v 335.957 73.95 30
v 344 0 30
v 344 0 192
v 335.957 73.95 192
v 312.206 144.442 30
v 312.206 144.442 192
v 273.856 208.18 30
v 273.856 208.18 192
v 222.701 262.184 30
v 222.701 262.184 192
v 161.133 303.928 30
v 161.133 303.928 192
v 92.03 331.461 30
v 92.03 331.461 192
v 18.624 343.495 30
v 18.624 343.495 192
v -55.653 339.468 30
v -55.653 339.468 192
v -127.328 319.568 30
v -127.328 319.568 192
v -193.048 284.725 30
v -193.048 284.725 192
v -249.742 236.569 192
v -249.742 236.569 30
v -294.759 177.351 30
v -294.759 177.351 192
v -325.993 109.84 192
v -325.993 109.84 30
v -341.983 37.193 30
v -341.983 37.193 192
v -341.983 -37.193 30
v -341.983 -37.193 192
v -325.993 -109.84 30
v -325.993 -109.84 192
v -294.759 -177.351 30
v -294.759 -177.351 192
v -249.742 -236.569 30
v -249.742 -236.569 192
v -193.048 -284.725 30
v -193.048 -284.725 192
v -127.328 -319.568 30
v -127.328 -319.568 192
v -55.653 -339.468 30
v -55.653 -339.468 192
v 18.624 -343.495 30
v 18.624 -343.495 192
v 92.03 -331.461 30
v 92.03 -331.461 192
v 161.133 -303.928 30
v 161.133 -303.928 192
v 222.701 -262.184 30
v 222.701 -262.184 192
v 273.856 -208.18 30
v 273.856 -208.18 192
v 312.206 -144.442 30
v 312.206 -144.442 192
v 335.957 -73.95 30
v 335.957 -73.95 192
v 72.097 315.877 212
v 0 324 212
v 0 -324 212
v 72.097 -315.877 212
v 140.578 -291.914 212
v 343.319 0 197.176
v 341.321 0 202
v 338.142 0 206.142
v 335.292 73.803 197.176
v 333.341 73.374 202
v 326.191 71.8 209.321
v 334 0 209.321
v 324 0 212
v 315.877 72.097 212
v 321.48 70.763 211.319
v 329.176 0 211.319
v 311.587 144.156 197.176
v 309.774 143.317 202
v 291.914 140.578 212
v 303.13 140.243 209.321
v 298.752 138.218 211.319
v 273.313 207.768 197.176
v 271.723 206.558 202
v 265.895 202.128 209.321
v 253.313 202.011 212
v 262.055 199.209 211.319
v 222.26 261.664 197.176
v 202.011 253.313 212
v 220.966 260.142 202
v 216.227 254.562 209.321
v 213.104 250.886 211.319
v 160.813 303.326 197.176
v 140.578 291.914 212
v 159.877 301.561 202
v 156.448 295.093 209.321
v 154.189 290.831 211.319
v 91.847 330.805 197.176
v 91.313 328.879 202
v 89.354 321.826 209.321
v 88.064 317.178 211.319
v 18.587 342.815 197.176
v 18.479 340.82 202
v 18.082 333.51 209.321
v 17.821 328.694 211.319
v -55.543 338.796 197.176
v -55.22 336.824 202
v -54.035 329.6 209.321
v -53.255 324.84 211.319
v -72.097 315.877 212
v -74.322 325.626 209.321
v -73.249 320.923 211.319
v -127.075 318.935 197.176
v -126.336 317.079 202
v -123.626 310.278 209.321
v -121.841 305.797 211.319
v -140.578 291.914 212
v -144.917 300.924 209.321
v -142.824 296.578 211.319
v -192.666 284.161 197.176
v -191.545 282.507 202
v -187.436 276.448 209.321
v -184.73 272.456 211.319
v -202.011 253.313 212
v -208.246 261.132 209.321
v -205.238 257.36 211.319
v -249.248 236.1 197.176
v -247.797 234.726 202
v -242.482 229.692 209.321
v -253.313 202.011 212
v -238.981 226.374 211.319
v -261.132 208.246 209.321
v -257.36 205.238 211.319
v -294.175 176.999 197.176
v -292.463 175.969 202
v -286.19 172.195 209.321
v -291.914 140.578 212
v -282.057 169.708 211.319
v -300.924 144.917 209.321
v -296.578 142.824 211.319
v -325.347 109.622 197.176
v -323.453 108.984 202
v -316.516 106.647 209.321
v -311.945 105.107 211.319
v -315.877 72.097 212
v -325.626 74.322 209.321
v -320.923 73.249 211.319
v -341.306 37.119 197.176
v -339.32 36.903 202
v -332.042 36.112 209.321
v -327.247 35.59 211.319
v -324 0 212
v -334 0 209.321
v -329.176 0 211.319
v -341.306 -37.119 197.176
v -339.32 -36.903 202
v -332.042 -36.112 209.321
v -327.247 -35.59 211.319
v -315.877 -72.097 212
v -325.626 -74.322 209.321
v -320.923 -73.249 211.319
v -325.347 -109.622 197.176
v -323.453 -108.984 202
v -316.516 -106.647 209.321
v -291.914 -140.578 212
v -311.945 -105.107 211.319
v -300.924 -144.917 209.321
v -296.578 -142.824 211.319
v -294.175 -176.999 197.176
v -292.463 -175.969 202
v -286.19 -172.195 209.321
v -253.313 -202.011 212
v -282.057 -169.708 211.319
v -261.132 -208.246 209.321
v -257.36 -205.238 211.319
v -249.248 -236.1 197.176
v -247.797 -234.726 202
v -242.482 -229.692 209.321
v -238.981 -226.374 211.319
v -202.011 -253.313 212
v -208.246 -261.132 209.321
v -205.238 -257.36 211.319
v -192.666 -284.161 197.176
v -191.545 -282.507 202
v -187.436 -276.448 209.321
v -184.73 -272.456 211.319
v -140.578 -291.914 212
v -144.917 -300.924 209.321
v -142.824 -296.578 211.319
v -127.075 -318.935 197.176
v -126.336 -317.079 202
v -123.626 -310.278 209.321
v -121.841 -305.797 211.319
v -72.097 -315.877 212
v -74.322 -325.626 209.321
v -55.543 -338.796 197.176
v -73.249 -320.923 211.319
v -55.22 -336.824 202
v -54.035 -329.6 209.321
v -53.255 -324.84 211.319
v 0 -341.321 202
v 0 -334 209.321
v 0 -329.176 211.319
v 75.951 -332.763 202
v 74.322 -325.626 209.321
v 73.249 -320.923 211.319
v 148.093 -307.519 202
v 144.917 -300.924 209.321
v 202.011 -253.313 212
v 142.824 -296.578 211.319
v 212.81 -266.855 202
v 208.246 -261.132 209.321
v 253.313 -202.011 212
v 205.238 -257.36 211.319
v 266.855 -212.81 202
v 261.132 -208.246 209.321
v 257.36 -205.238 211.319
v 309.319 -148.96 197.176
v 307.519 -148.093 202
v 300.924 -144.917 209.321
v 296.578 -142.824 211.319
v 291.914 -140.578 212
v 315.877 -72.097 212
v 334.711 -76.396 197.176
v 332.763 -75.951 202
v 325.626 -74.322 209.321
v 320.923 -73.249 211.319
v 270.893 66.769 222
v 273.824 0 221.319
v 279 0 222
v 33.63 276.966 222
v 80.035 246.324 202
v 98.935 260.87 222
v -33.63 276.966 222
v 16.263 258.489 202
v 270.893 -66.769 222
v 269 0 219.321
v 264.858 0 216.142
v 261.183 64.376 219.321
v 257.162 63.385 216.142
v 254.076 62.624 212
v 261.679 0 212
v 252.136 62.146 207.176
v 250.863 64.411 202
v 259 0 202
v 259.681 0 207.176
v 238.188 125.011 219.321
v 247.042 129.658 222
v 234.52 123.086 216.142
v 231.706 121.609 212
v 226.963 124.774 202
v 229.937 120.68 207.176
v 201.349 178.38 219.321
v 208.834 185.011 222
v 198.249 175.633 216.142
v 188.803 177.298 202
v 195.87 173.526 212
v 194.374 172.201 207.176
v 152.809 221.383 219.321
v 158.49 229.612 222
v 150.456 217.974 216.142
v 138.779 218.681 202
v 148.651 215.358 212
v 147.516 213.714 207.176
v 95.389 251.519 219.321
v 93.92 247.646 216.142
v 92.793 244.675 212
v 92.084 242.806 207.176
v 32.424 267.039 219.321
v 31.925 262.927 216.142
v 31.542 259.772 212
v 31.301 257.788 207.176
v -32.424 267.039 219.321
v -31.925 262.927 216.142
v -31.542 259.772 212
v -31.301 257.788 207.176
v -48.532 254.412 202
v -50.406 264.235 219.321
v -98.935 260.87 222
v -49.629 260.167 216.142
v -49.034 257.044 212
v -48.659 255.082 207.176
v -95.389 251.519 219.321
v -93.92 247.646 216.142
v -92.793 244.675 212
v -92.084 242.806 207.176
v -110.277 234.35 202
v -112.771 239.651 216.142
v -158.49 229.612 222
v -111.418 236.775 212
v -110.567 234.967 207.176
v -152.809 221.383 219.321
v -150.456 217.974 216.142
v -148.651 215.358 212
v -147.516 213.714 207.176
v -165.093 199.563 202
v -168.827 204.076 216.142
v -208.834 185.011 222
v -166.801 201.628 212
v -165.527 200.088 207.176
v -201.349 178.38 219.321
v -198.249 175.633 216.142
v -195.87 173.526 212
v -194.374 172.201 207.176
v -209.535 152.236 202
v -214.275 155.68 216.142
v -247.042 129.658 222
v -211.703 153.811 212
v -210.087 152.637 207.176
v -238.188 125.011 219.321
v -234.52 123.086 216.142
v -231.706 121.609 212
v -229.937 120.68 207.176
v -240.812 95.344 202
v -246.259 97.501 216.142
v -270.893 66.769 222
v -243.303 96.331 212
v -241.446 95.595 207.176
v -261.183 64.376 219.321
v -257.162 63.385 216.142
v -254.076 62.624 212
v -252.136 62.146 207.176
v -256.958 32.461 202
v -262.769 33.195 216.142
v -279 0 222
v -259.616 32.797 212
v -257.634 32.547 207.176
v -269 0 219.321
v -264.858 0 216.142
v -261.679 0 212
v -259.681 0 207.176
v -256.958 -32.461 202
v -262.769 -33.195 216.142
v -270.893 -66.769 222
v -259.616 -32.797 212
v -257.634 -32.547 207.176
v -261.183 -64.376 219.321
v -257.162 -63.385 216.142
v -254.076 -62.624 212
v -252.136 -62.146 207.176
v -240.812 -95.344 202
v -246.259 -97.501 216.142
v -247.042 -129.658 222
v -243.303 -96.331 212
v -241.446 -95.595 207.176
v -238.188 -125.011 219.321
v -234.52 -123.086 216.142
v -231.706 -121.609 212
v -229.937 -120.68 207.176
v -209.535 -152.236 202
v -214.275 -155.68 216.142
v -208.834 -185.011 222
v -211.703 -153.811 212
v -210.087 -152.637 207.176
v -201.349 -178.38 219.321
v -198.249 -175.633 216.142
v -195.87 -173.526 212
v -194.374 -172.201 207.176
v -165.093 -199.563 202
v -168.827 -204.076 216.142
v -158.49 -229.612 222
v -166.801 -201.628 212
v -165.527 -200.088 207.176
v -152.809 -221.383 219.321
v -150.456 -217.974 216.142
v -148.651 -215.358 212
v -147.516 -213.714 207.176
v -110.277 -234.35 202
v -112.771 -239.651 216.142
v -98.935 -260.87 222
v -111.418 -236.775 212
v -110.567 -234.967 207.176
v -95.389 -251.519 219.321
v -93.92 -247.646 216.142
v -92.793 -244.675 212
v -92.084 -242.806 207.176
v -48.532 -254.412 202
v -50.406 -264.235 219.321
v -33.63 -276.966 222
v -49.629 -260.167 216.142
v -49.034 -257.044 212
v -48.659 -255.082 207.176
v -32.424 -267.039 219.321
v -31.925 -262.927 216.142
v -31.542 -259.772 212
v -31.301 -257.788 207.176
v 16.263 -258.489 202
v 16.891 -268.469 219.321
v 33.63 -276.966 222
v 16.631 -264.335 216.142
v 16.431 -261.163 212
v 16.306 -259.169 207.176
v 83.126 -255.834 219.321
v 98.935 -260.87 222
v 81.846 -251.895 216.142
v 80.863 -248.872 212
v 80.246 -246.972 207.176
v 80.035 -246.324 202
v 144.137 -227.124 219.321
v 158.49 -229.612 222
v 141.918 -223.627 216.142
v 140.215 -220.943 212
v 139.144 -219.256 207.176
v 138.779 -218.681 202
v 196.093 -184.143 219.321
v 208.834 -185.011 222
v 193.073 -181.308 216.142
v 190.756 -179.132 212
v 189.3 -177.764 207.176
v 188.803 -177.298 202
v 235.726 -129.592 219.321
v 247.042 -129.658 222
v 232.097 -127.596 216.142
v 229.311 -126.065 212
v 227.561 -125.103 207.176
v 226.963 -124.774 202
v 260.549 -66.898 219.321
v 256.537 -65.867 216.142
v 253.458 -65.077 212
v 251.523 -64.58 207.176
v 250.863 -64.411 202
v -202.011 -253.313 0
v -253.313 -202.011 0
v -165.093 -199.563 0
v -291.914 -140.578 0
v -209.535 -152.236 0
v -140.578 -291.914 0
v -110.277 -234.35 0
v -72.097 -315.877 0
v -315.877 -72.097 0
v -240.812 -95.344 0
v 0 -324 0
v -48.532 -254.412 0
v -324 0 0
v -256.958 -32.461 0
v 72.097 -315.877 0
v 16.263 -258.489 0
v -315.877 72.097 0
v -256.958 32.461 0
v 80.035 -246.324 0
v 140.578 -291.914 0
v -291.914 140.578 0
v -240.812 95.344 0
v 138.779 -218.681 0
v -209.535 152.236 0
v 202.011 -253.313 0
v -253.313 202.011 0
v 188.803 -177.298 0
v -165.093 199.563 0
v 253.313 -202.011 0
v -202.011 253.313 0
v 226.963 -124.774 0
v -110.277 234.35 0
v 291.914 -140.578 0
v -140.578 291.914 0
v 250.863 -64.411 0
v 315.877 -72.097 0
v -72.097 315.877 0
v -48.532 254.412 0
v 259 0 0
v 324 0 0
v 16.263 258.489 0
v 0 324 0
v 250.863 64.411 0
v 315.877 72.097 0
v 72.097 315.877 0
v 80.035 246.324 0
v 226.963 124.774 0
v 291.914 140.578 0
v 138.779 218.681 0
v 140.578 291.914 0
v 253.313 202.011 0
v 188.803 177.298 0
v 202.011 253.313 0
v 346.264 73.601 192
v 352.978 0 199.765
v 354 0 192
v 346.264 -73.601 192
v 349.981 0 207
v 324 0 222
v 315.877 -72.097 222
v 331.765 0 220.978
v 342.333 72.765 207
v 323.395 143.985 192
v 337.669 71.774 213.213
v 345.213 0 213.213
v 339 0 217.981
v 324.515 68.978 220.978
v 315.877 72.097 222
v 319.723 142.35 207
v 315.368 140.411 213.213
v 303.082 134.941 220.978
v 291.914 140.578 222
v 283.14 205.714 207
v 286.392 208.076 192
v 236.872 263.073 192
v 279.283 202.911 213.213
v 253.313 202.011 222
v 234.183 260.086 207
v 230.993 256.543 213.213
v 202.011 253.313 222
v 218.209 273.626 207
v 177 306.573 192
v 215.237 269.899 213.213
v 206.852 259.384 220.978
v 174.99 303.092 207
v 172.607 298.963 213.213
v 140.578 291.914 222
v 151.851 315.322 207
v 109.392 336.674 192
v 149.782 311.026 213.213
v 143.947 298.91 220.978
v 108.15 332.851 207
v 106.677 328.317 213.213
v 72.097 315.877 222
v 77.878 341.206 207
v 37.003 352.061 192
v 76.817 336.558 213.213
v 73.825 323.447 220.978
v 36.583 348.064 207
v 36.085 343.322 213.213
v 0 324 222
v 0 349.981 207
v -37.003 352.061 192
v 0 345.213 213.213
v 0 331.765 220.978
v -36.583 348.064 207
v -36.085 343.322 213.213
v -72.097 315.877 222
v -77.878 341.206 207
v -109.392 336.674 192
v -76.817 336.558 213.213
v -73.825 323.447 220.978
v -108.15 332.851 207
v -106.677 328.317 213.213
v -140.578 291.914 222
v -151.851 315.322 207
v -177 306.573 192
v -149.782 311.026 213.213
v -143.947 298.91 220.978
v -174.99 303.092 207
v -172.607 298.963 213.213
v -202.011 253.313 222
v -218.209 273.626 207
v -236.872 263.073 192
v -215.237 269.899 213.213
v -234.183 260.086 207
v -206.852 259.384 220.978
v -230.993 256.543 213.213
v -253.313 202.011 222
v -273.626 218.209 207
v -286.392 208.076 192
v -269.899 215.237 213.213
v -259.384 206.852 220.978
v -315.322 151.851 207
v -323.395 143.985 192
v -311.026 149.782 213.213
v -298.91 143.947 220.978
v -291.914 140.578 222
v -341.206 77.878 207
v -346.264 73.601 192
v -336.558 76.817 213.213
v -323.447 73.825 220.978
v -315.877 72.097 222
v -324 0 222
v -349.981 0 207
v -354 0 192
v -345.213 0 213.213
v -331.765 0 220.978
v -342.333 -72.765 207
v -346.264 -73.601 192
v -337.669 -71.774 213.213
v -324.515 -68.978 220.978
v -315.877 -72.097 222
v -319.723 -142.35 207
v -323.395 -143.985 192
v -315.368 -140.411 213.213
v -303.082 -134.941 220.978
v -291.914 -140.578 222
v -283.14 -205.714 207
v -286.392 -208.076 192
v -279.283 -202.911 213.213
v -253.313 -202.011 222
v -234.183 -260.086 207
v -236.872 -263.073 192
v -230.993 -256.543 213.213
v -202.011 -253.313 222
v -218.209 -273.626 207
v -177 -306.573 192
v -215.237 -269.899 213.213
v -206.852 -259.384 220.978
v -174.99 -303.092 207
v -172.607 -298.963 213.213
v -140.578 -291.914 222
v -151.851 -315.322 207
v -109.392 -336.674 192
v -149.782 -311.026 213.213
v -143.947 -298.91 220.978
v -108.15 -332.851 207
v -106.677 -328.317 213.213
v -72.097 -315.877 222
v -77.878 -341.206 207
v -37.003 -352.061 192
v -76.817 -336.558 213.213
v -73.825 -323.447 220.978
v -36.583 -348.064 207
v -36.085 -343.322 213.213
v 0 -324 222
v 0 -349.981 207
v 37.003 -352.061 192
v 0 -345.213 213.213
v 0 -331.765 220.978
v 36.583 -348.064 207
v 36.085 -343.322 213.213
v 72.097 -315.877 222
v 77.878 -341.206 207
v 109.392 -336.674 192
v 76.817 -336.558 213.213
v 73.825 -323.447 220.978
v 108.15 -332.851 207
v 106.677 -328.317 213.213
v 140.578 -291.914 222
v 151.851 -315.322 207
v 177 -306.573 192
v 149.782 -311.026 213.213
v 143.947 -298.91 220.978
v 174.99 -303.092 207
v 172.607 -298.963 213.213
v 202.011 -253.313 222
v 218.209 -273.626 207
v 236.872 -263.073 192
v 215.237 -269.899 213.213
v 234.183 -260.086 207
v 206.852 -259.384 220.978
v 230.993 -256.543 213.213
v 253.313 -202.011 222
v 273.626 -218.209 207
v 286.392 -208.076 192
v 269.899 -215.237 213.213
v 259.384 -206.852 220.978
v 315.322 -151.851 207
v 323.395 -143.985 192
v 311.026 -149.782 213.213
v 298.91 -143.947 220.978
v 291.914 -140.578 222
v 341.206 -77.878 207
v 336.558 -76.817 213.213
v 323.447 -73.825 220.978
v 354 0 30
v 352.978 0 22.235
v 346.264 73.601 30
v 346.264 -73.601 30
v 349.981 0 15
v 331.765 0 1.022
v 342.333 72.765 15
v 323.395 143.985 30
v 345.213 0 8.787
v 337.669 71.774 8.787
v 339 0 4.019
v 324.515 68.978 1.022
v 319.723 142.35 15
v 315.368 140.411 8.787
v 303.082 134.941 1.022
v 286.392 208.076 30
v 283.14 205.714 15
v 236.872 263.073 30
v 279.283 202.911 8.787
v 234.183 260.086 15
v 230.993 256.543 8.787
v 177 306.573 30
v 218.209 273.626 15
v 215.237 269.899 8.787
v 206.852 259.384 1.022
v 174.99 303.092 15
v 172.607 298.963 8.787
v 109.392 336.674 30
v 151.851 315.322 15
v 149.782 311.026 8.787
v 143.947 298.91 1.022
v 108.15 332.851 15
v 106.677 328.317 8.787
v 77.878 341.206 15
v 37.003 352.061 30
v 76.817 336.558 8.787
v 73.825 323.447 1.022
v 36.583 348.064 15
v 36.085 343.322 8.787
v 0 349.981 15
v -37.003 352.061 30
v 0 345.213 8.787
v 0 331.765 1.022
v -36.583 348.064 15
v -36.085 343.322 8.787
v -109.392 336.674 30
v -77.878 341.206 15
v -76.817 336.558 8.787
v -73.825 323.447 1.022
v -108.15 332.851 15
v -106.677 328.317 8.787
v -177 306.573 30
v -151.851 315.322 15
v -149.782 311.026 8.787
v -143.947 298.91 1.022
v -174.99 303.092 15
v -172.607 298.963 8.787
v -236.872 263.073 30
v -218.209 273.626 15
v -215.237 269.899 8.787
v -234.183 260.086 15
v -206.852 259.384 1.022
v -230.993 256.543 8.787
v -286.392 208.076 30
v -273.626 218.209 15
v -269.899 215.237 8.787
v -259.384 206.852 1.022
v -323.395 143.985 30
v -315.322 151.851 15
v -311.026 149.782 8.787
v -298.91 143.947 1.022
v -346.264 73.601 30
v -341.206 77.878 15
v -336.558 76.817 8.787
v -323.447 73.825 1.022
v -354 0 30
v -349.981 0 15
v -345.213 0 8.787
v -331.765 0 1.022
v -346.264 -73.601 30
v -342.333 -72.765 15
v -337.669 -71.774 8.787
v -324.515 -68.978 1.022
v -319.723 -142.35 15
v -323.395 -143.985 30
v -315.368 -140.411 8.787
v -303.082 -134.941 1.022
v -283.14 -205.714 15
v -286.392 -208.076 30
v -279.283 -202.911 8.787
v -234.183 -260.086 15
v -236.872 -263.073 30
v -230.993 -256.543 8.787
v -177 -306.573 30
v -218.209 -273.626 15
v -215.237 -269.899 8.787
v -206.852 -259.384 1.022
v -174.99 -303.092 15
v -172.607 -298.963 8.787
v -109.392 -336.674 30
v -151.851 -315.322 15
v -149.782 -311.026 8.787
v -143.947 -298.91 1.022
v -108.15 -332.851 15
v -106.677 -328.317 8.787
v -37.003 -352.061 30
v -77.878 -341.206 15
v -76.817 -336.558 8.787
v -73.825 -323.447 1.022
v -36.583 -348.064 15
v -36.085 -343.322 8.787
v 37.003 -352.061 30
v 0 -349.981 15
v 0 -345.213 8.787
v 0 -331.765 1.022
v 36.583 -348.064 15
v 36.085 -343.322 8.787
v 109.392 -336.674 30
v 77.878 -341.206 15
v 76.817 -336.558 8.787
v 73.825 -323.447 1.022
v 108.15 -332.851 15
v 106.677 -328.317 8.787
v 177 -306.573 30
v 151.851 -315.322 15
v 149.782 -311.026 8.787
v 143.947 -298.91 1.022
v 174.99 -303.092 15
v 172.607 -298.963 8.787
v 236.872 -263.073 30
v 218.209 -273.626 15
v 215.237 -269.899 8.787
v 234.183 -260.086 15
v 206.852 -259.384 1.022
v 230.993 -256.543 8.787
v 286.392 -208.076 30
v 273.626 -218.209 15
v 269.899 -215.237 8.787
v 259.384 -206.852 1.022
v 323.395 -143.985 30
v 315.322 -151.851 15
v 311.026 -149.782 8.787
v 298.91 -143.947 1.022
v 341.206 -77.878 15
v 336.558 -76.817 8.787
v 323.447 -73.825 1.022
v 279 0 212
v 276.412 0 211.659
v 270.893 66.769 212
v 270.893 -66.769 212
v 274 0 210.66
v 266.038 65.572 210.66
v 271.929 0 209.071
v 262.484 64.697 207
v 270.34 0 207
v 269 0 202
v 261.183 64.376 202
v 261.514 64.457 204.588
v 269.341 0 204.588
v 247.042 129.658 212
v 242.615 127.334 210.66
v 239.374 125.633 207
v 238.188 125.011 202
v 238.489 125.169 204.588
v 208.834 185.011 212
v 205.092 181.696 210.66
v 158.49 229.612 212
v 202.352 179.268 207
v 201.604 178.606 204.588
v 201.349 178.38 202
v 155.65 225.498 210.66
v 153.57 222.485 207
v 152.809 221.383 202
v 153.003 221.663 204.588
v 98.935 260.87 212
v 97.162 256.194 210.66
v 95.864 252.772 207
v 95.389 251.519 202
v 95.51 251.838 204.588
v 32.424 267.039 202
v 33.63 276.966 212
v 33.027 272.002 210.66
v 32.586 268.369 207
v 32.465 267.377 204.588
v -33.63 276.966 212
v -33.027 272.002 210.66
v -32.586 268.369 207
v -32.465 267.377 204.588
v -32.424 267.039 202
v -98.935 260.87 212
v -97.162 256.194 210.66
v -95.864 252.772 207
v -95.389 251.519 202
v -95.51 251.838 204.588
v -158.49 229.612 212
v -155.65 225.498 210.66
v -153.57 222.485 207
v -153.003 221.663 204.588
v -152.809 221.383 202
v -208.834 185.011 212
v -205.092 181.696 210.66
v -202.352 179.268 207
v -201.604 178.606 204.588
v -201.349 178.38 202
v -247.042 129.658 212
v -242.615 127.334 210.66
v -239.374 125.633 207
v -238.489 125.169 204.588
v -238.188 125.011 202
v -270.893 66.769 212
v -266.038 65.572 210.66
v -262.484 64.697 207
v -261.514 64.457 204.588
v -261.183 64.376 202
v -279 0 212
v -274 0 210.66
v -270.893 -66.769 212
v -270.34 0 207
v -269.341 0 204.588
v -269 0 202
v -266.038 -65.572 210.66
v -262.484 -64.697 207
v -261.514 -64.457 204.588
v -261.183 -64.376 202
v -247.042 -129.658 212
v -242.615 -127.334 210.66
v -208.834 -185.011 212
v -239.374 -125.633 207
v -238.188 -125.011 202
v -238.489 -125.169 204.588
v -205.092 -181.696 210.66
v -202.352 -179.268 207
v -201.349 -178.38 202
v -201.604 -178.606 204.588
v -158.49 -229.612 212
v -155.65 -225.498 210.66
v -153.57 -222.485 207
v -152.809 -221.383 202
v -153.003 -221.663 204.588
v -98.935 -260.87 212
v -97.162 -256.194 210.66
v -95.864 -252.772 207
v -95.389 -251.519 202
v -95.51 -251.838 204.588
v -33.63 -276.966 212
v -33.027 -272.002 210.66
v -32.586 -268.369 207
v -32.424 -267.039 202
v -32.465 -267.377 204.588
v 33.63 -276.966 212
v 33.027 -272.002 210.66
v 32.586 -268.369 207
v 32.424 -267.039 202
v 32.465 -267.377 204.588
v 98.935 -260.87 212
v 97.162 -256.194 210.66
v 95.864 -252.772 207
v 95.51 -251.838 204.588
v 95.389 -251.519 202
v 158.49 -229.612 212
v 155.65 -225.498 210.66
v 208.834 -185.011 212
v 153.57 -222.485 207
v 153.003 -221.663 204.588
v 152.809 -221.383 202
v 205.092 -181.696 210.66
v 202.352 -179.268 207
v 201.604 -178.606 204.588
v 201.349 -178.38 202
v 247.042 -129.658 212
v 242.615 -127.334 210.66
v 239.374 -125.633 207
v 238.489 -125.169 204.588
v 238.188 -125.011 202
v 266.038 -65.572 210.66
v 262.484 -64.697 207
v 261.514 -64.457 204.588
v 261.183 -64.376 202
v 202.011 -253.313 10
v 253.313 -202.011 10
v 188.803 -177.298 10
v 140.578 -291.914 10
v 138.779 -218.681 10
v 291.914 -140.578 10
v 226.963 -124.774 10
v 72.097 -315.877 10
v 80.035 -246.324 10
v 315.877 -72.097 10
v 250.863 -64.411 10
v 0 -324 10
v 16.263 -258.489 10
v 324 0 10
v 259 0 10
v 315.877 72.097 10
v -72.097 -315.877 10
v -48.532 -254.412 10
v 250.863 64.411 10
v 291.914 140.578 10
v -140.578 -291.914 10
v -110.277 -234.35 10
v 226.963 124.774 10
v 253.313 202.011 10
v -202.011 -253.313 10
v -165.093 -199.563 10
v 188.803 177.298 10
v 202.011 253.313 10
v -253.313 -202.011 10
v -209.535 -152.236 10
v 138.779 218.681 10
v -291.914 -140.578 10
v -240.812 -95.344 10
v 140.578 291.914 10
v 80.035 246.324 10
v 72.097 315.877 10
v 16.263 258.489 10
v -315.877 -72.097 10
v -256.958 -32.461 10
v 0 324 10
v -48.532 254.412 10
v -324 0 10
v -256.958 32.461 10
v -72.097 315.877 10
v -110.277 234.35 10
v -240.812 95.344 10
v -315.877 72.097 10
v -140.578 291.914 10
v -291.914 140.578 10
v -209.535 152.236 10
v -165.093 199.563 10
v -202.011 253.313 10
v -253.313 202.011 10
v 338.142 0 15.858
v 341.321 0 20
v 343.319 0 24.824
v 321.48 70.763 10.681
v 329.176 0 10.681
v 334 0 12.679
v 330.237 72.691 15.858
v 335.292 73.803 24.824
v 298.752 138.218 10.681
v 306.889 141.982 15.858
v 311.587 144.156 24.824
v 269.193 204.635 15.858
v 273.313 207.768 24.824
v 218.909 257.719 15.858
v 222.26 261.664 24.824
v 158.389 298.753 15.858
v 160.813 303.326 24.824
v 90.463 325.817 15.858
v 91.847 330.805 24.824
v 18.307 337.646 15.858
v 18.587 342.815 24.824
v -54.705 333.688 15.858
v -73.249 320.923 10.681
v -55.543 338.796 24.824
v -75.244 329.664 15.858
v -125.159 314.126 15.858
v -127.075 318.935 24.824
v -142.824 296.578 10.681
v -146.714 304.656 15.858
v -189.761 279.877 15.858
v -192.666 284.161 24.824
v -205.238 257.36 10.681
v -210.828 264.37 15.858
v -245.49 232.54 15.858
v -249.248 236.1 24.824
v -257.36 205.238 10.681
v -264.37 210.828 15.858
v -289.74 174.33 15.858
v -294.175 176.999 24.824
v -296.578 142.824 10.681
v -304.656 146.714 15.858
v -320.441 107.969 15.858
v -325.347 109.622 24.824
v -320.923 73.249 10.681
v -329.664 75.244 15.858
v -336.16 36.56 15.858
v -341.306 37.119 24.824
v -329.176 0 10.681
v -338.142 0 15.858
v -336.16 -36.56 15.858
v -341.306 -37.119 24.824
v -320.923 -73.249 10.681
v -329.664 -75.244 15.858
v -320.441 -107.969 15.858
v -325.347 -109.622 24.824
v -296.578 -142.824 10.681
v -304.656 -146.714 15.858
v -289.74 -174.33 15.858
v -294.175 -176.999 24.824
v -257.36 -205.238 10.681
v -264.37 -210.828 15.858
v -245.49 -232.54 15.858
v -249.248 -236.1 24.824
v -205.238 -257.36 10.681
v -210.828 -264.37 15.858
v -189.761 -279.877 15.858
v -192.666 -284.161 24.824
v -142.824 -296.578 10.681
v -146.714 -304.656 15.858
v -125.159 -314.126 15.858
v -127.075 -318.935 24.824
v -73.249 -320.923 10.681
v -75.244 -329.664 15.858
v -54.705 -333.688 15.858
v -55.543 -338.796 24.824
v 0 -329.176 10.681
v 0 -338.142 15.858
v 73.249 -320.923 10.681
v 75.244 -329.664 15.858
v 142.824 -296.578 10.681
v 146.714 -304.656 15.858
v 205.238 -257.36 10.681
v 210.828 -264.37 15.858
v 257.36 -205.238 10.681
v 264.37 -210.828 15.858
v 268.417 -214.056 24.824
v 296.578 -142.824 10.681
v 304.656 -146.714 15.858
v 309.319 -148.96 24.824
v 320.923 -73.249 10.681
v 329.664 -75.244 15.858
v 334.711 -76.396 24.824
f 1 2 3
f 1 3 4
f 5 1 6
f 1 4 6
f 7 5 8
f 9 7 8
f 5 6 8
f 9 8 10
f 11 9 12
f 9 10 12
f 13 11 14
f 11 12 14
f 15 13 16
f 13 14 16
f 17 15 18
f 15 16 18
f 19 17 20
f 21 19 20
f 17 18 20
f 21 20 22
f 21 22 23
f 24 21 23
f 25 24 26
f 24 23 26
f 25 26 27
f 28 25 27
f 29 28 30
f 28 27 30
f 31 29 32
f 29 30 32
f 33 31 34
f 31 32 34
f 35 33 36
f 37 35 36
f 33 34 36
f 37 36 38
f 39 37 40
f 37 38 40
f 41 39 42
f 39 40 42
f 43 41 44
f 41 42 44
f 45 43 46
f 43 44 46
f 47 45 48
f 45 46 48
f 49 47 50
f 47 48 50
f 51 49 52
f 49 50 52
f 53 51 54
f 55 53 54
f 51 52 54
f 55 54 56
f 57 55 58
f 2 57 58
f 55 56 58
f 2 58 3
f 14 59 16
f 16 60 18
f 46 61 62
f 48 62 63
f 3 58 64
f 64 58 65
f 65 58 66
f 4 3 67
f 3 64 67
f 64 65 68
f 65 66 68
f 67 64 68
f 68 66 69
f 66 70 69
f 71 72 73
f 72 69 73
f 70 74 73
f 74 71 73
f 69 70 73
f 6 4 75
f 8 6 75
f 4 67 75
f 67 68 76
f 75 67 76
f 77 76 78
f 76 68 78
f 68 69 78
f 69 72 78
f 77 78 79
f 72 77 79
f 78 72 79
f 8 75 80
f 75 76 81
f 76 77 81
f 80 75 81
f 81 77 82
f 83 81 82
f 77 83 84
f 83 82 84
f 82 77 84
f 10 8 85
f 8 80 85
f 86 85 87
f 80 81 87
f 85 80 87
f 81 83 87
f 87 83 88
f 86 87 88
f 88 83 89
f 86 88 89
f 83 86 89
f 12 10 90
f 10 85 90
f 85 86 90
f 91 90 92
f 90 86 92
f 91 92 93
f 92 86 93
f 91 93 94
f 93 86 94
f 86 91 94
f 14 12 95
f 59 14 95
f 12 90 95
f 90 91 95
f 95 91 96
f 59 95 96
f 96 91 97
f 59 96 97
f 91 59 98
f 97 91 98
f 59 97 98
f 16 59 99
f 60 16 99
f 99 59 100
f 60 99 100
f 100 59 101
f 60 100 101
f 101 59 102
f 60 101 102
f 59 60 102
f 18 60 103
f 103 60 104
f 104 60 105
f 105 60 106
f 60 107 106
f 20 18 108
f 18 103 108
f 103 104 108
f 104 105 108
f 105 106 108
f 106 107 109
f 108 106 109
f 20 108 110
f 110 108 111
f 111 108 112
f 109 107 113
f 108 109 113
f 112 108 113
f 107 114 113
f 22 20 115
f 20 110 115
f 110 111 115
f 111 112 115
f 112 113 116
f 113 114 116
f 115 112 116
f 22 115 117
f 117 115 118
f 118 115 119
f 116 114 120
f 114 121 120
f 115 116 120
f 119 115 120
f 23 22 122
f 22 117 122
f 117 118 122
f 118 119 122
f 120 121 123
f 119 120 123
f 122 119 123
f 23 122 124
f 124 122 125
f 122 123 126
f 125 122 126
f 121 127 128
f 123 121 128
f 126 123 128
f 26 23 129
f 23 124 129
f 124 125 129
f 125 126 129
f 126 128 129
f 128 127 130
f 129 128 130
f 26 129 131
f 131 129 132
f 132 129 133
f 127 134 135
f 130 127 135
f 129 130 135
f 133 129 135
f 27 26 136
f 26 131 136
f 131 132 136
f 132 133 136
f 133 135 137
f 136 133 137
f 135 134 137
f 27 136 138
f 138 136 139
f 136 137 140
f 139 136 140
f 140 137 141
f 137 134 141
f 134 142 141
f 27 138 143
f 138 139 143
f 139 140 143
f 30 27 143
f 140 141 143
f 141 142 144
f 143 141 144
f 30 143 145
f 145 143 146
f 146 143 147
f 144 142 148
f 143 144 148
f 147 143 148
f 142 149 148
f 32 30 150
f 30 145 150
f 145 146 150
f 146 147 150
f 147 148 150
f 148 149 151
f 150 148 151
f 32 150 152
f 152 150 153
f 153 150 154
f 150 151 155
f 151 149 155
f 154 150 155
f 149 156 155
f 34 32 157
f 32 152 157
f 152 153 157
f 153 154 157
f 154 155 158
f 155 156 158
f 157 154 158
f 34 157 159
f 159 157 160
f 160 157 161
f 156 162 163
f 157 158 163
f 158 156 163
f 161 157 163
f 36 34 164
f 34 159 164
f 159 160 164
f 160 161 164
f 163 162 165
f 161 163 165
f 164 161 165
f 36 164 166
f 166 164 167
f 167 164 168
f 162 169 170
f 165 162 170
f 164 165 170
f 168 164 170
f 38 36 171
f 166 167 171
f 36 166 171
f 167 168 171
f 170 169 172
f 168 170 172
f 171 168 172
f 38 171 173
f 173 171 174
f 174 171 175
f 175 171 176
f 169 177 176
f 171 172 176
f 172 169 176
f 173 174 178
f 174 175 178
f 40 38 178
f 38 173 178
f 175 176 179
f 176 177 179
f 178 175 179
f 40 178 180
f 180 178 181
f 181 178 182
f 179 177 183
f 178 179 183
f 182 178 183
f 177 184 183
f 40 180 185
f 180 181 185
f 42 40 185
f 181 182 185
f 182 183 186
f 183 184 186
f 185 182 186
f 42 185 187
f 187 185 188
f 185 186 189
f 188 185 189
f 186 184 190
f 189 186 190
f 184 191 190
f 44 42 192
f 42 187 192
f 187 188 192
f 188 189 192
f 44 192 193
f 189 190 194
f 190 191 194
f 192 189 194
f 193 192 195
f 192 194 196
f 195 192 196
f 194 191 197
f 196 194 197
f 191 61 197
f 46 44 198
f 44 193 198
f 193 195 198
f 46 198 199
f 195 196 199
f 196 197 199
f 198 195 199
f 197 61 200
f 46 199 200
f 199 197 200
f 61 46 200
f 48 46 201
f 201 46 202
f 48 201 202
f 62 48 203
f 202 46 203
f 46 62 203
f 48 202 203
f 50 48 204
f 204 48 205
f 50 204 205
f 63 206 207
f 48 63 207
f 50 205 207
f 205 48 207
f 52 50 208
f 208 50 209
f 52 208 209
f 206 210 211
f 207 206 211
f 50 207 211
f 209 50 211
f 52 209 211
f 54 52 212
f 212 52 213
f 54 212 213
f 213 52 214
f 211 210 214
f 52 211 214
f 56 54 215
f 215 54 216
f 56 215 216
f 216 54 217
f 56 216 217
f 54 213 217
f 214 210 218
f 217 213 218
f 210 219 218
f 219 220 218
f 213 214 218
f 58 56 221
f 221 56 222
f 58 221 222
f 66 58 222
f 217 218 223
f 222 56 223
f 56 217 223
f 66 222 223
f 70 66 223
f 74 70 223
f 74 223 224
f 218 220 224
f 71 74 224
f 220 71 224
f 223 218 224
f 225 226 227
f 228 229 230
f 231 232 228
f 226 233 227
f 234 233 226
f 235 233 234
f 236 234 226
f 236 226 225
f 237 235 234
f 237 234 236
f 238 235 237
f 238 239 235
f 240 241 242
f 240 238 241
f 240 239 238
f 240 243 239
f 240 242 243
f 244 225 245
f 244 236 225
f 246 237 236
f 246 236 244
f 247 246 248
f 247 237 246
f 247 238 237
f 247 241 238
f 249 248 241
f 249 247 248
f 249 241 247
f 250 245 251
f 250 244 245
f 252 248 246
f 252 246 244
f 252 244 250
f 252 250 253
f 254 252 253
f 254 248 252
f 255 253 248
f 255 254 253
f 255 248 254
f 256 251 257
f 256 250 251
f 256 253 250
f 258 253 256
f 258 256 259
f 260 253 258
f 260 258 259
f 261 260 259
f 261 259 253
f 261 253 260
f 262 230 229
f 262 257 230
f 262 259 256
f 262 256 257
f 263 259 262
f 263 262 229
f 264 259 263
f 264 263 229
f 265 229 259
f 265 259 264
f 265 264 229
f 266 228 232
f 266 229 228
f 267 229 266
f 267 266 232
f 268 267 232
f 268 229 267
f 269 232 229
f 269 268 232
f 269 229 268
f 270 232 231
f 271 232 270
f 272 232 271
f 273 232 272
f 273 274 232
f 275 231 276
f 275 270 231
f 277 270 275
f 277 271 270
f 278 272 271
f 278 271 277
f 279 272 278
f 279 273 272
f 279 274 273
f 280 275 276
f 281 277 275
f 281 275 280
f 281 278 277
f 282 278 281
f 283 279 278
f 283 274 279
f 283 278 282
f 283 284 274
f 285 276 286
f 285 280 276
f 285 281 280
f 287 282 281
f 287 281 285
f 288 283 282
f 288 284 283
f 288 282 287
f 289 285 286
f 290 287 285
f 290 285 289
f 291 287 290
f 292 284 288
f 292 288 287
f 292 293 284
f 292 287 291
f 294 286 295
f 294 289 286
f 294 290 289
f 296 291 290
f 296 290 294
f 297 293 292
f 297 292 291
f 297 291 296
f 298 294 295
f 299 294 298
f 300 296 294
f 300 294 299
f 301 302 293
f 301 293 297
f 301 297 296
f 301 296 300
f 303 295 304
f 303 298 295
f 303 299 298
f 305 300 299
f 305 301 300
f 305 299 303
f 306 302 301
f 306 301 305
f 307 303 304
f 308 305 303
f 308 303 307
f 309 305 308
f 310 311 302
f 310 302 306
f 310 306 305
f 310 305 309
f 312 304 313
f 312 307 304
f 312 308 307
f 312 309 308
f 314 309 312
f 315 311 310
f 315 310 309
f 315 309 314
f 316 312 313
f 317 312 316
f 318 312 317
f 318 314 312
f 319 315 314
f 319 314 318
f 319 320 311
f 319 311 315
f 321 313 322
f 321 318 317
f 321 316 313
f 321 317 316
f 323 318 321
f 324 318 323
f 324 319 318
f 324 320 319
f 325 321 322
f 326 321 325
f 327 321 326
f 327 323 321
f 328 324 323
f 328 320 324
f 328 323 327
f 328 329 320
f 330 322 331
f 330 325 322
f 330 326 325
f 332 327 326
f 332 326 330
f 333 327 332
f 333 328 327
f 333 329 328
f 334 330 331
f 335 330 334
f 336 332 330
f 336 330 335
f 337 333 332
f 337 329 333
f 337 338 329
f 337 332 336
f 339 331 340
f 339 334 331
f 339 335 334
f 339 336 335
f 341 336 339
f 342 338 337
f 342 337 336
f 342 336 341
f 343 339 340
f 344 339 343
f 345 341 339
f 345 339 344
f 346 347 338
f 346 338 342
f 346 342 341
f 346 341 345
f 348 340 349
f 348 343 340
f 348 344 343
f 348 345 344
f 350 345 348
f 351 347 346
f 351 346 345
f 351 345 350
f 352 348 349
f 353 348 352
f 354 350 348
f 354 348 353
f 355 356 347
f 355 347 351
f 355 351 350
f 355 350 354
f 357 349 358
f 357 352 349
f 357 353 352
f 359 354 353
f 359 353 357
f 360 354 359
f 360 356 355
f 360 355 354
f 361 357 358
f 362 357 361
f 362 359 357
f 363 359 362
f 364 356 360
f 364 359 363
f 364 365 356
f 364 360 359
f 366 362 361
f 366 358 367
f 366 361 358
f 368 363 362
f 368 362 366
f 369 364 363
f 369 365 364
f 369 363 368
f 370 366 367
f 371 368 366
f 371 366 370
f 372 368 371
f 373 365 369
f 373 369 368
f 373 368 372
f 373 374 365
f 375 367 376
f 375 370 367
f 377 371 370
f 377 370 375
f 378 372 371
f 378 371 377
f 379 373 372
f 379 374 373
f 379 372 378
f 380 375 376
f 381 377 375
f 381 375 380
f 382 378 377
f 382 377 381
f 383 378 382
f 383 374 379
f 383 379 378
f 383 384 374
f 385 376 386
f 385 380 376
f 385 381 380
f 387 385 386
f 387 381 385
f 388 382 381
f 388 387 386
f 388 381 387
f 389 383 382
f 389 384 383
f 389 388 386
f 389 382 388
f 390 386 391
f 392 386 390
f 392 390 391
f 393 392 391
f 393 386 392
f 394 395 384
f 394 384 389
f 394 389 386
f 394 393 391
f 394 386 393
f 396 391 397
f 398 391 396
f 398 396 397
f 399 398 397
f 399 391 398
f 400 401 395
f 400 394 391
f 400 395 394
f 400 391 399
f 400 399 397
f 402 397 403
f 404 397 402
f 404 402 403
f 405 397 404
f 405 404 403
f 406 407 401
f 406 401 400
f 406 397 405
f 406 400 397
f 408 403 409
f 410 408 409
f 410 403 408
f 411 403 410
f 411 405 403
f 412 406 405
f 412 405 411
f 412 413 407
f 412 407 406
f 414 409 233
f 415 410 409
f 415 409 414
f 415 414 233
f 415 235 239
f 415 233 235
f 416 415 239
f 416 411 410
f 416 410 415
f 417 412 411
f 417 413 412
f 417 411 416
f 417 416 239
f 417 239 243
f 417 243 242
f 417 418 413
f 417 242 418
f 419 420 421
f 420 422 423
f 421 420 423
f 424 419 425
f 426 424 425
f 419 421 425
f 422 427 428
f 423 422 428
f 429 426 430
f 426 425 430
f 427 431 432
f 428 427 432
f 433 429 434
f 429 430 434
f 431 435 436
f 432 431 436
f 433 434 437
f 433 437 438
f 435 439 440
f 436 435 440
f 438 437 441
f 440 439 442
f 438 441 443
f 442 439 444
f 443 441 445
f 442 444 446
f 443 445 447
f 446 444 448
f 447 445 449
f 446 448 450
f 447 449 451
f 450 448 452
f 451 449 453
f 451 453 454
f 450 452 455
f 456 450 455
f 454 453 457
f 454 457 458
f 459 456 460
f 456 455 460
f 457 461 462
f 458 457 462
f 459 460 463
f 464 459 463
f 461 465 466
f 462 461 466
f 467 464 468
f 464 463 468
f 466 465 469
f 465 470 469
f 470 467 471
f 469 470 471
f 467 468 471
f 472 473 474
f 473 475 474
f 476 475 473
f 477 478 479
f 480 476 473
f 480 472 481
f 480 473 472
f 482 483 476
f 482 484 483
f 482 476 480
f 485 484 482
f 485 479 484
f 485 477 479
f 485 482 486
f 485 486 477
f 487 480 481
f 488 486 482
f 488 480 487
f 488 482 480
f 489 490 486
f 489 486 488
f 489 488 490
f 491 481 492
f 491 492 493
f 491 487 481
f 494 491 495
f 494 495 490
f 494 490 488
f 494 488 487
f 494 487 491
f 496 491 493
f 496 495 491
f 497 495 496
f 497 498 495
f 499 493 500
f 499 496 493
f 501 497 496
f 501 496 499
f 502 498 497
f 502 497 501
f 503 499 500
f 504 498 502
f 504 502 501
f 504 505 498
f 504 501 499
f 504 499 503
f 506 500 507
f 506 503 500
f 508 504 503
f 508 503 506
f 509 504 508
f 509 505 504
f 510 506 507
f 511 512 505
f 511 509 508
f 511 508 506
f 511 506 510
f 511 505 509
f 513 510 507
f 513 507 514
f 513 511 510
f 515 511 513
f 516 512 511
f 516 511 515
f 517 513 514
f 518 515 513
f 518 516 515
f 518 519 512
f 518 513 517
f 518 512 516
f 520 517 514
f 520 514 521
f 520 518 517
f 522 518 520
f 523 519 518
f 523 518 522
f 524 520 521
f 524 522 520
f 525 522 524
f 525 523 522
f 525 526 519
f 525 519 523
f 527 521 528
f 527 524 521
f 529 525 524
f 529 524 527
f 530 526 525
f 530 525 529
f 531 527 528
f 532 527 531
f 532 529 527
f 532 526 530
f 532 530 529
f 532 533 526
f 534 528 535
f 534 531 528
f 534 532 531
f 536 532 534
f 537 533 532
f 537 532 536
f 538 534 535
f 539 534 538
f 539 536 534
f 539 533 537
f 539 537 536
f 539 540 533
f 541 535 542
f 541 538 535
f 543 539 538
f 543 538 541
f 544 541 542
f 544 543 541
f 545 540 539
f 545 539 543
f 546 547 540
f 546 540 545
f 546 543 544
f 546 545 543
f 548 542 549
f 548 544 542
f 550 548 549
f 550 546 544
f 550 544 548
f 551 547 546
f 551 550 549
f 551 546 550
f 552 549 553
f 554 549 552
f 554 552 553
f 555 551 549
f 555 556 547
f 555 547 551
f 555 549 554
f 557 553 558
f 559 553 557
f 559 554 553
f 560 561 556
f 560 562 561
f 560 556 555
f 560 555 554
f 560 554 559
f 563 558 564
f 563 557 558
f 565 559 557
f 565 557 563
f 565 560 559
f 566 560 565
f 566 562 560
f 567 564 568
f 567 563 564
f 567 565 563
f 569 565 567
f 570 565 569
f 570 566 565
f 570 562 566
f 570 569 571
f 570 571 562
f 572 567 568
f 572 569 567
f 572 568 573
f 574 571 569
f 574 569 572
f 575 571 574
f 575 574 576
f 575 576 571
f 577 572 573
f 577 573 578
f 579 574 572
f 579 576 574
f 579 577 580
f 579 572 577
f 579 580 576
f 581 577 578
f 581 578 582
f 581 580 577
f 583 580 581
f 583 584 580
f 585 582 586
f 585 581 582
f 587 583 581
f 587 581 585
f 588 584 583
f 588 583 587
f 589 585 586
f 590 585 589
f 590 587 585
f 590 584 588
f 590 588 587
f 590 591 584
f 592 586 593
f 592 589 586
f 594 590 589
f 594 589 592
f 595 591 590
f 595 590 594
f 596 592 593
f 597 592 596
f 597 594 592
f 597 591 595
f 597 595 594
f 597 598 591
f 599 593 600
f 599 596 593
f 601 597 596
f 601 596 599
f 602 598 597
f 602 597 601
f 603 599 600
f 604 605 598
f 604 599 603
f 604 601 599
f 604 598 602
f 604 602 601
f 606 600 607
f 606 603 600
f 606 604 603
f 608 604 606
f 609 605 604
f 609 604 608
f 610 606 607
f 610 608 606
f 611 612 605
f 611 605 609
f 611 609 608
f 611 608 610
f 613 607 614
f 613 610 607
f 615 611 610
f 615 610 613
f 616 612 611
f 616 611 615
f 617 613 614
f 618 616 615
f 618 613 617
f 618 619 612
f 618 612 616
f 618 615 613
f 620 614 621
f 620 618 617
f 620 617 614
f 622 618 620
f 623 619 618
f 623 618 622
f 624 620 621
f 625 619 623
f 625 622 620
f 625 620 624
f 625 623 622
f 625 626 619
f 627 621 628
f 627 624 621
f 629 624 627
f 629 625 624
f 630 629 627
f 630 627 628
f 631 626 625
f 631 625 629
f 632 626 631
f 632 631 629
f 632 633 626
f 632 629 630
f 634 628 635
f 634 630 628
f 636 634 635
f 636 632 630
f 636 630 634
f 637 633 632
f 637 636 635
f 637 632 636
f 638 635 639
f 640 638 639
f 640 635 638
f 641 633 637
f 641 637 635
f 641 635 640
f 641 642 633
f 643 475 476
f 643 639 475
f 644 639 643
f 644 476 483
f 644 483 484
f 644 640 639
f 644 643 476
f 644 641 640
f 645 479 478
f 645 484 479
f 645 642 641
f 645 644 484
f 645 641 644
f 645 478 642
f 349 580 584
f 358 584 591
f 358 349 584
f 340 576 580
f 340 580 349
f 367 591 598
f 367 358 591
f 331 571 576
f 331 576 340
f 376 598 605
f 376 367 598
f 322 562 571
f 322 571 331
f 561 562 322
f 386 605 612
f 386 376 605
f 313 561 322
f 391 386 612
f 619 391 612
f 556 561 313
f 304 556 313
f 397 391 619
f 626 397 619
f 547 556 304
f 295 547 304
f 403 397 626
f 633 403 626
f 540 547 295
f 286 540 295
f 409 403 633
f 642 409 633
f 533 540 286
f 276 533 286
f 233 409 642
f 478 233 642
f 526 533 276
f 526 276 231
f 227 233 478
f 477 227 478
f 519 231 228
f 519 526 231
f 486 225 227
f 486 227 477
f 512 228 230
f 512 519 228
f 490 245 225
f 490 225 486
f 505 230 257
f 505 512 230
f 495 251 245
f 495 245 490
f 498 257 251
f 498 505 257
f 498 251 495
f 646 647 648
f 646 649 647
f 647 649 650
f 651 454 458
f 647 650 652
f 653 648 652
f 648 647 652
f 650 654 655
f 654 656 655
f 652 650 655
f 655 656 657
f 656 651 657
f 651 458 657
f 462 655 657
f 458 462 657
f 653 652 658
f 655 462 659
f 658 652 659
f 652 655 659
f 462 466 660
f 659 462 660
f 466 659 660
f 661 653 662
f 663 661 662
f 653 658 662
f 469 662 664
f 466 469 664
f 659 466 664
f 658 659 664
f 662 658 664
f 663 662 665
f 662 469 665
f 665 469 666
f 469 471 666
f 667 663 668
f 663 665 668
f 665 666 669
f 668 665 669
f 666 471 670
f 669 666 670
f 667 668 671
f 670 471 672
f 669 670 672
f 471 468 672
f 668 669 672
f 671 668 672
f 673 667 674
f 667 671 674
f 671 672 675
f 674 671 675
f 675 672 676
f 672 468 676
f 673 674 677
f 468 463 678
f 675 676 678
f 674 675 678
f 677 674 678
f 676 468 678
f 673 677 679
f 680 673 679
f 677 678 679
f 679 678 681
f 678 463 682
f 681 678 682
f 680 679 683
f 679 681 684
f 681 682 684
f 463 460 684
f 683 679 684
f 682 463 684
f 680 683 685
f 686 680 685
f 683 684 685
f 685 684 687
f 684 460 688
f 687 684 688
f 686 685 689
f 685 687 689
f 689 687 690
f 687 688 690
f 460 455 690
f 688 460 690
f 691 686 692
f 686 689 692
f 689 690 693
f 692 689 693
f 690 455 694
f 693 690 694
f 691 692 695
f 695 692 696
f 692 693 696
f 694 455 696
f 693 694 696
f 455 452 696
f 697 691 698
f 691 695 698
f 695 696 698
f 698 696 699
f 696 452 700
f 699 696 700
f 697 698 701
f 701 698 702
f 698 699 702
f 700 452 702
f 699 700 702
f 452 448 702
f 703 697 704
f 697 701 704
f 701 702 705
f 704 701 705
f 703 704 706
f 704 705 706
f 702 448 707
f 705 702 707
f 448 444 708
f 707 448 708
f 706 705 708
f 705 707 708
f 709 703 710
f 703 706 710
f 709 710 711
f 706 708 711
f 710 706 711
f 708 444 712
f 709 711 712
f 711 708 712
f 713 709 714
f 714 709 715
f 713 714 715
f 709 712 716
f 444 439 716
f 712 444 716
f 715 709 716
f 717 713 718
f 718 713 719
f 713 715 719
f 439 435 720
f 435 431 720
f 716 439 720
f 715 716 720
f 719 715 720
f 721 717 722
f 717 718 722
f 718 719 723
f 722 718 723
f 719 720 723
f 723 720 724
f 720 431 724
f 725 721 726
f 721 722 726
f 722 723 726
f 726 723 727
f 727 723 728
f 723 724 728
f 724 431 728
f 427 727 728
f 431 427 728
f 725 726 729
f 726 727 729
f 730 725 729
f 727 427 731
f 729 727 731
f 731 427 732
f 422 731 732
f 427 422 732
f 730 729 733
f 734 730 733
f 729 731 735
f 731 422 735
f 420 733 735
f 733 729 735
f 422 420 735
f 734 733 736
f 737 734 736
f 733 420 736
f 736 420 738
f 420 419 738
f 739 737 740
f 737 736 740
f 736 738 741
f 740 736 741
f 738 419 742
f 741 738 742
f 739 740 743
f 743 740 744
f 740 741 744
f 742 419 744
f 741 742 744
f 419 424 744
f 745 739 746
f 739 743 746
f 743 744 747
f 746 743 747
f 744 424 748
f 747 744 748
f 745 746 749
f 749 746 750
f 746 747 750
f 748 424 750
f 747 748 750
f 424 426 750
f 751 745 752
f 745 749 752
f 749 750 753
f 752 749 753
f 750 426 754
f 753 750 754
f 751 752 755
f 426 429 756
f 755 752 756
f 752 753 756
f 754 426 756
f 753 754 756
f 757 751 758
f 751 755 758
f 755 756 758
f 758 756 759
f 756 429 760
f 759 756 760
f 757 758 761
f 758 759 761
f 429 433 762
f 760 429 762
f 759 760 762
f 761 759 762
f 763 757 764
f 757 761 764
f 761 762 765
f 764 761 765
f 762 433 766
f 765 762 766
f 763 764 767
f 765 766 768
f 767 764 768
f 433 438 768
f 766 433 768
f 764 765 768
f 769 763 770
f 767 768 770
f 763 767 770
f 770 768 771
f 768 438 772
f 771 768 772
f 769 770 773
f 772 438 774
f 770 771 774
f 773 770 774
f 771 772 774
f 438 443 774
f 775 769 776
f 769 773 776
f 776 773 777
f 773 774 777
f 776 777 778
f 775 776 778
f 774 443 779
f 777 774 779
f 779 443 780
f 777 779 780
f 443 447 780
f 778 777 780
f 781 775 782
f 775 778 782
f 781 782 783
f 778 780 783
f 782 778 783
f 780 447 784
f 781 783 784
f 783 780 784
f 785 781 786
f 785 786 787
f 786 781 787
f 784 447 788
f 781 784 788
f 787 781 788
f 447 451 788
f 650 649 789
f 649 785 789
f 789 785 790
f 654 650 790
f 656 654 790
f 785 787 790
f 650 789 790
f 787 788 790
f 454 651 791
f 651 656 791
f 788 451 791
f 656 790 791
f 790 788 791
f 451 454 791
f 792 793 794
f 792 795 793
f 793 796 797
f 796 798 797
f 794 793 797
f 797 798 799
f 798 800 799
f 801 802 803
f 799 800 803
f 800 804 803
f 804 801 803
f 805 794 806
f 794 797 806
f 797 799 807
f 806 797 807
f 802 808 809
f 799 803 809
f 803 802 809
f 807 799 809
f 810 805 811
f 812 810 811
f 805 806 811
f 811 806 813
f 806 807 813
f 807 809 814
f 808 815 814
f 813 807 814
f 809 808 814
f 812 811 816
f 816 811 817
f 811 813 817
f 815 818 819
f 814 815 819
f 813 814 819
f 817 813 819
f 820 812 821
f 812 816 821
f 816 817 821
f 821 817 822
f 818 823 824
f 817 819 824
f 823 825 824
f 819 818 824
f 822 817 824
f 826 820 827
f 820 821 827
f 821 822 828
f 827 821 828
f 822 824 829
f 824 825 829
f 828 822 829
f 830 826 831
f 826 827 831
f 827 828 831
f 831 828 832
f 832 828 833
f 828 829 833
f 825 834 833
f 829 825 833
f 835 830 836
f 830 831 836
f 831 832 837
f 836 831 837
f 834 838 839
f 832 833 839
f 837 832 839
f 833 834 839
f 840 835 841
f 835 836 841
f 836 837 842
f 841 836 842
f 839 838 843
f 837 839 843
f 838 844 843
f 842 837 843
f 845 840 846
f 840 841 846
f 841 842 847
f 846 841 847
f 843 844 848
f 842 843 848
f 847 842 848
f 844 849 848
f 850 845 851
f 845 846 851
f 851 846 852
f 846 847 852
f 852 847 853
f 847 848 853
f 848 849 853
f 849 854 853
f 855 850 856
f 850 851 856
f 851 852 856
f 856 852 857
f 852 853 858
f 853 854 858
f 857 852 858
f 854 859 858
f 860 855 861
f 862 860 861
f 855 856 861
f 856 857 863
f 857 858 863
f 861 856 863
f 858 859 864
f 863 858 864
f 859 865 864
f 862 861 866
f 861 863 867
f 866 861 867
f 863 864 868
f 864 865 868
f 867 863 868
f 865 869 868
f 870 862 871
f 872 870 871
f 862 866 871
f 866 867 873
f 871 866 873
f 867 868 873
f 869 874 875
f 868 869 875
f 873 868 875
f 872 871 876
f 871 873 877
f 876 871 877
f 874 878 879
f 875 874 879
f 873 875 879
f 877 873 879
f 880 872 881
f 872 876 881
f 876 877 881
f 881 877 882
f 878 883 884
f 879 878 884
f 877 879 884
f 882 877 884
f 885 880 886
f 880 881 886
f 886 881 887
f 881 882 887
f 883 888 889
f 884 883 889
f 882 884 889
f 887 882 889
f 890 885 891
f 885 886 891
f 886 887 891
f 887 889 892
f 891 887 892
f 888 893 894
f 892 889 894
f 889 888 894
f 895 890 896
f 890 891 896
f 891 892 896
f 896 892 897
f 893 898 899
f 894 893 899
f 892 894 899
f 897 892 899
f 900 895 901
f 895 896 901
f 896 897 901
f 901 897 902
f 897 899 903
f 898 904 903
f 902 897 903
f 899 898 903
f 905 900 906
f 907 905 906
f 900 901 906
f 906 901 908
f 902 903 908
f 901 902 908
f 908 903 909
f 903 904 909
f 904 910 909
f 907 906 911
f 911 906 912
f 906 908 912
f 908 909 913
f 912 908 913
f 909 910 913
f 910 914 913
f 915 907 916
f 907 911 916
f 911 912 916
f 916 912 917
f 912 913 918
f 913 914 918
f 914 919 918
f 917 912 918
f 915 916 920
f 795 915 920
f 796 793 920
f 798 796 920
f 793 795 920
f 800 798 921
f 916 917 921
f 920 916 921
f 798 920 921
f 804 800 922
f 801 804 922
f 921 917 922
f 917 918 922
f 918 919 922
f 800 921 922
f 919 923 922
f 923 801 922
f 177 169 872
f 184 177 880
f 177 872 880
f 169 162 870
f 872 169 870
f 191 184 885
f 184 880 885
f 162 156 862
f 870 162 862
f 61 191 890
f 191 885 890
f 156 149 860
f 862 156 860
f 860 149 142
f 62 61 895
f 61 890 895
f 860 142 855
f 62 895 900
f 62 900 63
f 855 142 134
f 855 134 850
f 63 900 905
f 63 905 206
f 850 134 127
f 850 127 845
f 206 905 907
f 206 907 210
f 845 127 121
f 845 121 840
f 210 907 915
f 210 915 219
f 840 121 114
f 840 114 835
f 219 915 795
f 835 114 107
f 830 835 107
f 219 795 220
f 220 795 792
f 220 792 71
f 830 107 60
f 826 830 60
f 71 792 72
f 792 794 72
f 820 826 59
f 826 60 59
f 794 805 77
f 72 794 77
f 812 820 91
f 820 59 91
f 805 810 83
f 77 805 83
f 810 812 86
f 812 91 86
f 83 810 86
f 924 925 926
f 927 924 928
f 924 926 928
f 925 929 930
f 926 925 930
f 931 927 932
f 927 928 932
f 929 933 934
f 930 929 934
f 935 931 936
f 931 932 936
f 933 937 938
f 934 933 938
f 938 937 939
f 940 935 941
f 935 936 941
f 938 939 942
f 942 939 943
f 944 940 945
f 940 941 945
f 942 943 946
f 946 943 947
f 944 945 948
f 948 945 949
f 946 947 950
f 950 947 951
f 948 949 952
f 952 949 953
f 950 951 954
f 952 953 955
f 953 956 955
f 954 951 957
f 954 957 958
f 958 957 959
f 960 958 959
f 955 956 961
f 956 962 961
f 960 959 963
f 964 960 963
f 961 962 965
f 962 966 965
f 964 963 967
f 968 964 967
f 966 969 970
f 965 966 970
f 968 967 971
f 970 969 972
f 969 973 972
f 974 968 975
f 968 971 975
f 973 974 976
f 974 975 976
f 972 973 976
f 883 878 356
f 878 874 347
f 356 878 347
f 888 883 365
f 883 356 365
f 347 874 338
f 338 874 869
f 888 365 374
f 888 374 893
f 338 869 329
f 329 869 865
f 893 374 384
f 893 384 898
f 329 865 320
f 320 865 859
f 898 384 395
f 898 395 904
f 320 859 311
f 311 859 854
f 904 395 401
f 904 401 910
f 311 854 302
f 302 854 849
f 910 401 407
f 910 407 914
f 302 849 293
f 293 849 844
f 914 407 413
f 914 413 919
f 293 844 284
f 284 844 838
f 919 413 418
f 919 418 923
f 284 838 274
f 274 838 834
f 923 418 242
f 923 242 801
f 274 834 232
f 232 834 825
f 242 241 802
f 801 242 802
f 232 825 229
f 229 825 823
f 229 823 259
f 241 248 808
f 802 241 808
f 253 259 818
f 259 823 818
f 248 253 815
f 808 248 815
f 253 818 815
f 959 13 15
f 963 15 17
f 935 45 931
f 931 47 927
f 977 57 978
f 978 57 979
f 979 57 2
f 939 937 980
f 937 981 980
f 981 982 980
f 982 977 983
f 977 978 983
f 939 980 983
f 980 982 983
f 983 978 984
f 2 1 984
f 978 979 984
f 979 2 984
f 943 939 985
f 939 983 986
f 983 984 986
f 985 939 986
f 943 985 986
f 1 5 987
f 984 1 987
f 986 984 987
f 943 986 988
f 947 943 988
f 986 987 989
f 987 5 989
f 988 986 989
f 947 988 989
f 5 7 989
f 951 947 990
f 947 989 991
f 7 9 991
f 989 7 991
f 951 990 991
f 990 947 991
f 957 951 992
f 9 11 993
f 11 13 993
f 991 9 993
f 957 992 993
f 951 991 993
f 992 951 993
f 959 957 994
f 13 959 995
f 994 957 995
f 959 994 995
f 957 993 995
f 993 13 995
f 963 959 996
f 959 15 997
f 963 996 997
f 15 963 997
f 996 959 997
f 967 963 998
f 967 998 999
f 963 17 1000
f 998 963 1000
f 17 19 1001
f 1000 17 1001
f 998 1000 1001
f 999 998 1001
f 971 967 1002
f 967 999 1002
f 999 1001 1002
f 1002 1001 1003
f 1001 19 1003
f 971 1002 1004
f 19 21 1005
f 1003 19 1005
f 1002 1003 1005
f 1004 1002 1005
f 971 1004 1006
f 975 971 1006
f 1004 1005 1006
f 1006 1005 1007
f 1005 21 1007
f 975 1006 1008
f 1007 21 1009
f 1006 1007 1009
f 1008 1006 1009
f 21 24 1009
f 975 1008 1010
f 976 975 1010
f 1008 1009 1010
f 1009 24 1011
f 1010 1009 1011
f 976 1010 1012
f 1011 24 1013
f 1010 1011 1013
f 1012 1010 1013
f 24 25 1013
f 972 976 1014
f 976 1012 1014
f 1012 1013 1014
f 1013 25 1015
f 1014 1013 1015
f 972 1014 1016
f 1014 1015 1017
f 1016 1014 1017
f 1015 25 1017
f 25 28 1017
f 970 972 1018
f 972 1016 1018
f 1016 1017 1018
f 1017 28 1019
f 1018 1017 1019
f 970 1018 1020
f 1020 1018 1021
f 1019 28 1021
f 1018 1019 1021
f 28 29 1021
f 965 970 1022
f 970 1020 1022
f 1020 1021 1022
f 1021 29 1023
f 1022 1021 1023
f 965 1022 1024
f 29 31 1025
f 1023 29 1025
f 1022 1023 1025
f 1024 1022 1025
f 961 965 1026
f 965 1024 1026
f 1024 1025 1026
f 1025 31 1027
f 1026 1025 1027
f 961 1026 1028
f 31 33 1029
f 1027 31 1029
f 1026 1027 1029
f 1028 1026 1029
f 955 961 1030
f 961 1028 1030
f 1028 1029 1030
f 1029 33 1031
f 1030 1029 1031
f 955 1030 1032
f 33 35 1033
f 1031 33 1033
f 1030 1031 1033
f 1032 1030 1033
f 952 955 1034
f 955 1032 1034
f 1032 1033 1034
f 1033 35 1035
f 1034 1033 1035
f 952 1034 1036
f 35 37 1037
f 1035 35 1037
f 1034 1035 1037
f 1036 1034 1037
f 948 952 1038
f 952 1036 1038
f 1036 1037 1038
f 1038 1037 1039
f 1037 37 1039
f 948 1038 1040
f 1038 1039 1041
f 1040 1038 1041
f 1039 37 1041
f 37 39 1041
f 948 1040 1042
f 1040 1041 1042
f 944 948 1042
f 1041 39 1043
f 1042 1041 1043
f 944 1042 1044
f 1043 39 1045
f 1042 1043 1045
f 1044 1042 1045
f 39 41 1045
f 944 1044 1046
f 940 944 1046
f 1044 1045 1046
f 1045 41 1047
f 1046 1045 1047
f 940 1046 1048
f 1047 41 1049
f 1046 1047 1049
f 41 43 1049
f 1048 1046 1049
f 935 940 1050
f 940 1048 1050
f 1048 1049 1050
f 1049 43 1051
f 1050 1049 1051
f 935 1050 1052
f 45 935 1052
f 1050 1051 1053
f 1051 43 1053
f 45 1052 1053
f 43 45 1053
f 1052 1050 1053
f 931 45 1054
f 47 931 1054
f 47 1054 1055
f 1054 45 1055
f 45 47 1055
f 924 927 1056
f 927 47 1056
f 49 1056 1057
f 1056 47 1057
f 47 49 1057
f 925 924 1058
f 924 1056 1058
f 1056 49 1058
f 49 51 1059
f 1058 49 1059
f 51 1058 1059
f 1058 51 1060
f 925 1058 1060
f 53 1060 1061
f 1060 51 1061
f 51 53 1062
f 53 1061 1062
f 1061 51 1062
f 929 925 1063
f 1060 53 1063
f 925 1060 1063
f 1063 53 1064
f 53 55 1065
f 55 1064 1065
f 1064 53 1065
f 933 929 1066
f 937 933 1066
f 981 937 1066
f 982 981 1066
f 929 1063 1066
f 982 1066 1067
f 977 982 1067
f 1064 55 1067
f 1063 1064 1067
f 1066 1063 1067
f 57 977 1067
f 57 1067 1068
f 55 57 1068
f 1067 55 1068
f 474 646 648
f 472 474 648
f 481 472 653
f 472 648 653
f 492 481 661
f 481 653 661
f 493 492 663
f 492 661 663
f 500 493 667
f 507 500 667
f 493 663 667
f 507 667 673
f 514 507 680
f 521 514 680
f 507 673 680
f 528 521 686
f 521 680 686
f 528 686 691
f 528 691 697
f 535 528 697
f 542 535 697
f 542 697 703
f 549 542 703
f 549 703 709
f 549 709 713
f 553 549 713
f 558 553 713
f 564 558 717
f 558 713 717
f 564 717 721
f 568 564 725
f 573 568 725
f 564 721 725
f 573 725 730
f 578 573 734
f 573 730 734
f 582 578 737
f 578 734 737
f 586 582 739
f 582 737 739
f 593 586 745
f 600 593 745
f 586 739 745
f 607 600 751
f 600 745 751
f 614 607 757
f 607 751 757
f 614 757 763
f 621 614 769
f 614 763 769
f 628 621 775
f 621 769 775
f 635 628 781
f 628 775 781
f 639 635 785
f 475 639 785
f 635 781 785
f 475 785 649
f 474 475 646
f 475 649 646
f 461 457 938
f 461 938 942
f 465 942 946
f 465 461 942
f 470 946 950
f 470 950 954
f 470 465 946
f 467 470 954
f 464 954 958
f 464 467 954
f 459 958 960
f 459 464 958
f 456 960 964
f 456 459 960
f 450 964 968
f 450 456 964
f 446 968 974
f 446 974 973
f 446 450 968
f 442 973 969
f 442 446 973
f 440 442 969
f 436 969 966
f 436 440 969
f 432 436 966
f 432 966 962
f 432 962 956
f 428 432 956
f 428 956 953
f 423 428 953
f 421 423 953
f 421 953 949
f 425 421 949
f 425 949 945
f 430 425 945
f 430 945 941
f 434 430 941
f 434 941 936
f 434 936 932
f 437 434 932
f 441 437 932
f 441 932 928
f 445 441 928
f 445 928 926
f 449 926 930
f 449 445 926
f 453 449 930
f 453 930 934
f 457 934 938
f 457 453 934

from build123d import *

# Parameters (mm, degrees)
SKETCH1_R           = 354
SKETCH1_R_2         = 259
BOSS_EXTRUDE1_DEPTH = 222
FILLET1_R           = 30
FILLET2_R           = 20


# Read off the part's stored shape, not the designer's step: Shell2
with BuildPart() as part:
    # Sketch1 → Boss-Extrude1 (new body)
    with BuildSketch(Plane.XY):
        Circle(SKETCH1_R)
        Circle(SKETCH1_R_2, mode=Mode.SUBTRACT)
    extrude(amount=BOSS_EXTRUDE1_DEPTH)

    # Fillet1
    fillet1_edges = [part.edges().sort_by_distance(p)[0] for p in [
        (-354, 0, 0),
        (-354, 0, 222),
    ]]
    fillet(fillet1_edges, radius=FILLET1_R)

    # Fillet2
    fillet2_edges = [part.edges().sort_by_distance(p)[0] for p in [
        (-259, 0, 222),
    ]]
    fillet(fillet2_edges, radius=FILLET2_R)

    # Shell2 outline → Shell2 (revolve, cut)
    with BuildSketch(Plane.XZ):
        with BuildLine():
            Line((269, 202), (259, 202))
            Line((259, 202), (259, 10))
            Line((259, 10), (324, 10))
            ThreePointArc((324, 10), (338.142135624, 15.857864376), (344, 30))
            Line((344, 30), (344, 192))
            ThreePointArc((344, 192), (338.142135624, 206.142135624), (324, 212))
            Line((324, 212), (279, 212))
            ThreePointArc((279, 212), (271.928932188, 209.071067812), (269, 202))
        make_face()
    revolve(axis=Axis((0, 0, 0), (0, 0, 1)), mode=Mode.SUBTRACT)


solid = part.part
